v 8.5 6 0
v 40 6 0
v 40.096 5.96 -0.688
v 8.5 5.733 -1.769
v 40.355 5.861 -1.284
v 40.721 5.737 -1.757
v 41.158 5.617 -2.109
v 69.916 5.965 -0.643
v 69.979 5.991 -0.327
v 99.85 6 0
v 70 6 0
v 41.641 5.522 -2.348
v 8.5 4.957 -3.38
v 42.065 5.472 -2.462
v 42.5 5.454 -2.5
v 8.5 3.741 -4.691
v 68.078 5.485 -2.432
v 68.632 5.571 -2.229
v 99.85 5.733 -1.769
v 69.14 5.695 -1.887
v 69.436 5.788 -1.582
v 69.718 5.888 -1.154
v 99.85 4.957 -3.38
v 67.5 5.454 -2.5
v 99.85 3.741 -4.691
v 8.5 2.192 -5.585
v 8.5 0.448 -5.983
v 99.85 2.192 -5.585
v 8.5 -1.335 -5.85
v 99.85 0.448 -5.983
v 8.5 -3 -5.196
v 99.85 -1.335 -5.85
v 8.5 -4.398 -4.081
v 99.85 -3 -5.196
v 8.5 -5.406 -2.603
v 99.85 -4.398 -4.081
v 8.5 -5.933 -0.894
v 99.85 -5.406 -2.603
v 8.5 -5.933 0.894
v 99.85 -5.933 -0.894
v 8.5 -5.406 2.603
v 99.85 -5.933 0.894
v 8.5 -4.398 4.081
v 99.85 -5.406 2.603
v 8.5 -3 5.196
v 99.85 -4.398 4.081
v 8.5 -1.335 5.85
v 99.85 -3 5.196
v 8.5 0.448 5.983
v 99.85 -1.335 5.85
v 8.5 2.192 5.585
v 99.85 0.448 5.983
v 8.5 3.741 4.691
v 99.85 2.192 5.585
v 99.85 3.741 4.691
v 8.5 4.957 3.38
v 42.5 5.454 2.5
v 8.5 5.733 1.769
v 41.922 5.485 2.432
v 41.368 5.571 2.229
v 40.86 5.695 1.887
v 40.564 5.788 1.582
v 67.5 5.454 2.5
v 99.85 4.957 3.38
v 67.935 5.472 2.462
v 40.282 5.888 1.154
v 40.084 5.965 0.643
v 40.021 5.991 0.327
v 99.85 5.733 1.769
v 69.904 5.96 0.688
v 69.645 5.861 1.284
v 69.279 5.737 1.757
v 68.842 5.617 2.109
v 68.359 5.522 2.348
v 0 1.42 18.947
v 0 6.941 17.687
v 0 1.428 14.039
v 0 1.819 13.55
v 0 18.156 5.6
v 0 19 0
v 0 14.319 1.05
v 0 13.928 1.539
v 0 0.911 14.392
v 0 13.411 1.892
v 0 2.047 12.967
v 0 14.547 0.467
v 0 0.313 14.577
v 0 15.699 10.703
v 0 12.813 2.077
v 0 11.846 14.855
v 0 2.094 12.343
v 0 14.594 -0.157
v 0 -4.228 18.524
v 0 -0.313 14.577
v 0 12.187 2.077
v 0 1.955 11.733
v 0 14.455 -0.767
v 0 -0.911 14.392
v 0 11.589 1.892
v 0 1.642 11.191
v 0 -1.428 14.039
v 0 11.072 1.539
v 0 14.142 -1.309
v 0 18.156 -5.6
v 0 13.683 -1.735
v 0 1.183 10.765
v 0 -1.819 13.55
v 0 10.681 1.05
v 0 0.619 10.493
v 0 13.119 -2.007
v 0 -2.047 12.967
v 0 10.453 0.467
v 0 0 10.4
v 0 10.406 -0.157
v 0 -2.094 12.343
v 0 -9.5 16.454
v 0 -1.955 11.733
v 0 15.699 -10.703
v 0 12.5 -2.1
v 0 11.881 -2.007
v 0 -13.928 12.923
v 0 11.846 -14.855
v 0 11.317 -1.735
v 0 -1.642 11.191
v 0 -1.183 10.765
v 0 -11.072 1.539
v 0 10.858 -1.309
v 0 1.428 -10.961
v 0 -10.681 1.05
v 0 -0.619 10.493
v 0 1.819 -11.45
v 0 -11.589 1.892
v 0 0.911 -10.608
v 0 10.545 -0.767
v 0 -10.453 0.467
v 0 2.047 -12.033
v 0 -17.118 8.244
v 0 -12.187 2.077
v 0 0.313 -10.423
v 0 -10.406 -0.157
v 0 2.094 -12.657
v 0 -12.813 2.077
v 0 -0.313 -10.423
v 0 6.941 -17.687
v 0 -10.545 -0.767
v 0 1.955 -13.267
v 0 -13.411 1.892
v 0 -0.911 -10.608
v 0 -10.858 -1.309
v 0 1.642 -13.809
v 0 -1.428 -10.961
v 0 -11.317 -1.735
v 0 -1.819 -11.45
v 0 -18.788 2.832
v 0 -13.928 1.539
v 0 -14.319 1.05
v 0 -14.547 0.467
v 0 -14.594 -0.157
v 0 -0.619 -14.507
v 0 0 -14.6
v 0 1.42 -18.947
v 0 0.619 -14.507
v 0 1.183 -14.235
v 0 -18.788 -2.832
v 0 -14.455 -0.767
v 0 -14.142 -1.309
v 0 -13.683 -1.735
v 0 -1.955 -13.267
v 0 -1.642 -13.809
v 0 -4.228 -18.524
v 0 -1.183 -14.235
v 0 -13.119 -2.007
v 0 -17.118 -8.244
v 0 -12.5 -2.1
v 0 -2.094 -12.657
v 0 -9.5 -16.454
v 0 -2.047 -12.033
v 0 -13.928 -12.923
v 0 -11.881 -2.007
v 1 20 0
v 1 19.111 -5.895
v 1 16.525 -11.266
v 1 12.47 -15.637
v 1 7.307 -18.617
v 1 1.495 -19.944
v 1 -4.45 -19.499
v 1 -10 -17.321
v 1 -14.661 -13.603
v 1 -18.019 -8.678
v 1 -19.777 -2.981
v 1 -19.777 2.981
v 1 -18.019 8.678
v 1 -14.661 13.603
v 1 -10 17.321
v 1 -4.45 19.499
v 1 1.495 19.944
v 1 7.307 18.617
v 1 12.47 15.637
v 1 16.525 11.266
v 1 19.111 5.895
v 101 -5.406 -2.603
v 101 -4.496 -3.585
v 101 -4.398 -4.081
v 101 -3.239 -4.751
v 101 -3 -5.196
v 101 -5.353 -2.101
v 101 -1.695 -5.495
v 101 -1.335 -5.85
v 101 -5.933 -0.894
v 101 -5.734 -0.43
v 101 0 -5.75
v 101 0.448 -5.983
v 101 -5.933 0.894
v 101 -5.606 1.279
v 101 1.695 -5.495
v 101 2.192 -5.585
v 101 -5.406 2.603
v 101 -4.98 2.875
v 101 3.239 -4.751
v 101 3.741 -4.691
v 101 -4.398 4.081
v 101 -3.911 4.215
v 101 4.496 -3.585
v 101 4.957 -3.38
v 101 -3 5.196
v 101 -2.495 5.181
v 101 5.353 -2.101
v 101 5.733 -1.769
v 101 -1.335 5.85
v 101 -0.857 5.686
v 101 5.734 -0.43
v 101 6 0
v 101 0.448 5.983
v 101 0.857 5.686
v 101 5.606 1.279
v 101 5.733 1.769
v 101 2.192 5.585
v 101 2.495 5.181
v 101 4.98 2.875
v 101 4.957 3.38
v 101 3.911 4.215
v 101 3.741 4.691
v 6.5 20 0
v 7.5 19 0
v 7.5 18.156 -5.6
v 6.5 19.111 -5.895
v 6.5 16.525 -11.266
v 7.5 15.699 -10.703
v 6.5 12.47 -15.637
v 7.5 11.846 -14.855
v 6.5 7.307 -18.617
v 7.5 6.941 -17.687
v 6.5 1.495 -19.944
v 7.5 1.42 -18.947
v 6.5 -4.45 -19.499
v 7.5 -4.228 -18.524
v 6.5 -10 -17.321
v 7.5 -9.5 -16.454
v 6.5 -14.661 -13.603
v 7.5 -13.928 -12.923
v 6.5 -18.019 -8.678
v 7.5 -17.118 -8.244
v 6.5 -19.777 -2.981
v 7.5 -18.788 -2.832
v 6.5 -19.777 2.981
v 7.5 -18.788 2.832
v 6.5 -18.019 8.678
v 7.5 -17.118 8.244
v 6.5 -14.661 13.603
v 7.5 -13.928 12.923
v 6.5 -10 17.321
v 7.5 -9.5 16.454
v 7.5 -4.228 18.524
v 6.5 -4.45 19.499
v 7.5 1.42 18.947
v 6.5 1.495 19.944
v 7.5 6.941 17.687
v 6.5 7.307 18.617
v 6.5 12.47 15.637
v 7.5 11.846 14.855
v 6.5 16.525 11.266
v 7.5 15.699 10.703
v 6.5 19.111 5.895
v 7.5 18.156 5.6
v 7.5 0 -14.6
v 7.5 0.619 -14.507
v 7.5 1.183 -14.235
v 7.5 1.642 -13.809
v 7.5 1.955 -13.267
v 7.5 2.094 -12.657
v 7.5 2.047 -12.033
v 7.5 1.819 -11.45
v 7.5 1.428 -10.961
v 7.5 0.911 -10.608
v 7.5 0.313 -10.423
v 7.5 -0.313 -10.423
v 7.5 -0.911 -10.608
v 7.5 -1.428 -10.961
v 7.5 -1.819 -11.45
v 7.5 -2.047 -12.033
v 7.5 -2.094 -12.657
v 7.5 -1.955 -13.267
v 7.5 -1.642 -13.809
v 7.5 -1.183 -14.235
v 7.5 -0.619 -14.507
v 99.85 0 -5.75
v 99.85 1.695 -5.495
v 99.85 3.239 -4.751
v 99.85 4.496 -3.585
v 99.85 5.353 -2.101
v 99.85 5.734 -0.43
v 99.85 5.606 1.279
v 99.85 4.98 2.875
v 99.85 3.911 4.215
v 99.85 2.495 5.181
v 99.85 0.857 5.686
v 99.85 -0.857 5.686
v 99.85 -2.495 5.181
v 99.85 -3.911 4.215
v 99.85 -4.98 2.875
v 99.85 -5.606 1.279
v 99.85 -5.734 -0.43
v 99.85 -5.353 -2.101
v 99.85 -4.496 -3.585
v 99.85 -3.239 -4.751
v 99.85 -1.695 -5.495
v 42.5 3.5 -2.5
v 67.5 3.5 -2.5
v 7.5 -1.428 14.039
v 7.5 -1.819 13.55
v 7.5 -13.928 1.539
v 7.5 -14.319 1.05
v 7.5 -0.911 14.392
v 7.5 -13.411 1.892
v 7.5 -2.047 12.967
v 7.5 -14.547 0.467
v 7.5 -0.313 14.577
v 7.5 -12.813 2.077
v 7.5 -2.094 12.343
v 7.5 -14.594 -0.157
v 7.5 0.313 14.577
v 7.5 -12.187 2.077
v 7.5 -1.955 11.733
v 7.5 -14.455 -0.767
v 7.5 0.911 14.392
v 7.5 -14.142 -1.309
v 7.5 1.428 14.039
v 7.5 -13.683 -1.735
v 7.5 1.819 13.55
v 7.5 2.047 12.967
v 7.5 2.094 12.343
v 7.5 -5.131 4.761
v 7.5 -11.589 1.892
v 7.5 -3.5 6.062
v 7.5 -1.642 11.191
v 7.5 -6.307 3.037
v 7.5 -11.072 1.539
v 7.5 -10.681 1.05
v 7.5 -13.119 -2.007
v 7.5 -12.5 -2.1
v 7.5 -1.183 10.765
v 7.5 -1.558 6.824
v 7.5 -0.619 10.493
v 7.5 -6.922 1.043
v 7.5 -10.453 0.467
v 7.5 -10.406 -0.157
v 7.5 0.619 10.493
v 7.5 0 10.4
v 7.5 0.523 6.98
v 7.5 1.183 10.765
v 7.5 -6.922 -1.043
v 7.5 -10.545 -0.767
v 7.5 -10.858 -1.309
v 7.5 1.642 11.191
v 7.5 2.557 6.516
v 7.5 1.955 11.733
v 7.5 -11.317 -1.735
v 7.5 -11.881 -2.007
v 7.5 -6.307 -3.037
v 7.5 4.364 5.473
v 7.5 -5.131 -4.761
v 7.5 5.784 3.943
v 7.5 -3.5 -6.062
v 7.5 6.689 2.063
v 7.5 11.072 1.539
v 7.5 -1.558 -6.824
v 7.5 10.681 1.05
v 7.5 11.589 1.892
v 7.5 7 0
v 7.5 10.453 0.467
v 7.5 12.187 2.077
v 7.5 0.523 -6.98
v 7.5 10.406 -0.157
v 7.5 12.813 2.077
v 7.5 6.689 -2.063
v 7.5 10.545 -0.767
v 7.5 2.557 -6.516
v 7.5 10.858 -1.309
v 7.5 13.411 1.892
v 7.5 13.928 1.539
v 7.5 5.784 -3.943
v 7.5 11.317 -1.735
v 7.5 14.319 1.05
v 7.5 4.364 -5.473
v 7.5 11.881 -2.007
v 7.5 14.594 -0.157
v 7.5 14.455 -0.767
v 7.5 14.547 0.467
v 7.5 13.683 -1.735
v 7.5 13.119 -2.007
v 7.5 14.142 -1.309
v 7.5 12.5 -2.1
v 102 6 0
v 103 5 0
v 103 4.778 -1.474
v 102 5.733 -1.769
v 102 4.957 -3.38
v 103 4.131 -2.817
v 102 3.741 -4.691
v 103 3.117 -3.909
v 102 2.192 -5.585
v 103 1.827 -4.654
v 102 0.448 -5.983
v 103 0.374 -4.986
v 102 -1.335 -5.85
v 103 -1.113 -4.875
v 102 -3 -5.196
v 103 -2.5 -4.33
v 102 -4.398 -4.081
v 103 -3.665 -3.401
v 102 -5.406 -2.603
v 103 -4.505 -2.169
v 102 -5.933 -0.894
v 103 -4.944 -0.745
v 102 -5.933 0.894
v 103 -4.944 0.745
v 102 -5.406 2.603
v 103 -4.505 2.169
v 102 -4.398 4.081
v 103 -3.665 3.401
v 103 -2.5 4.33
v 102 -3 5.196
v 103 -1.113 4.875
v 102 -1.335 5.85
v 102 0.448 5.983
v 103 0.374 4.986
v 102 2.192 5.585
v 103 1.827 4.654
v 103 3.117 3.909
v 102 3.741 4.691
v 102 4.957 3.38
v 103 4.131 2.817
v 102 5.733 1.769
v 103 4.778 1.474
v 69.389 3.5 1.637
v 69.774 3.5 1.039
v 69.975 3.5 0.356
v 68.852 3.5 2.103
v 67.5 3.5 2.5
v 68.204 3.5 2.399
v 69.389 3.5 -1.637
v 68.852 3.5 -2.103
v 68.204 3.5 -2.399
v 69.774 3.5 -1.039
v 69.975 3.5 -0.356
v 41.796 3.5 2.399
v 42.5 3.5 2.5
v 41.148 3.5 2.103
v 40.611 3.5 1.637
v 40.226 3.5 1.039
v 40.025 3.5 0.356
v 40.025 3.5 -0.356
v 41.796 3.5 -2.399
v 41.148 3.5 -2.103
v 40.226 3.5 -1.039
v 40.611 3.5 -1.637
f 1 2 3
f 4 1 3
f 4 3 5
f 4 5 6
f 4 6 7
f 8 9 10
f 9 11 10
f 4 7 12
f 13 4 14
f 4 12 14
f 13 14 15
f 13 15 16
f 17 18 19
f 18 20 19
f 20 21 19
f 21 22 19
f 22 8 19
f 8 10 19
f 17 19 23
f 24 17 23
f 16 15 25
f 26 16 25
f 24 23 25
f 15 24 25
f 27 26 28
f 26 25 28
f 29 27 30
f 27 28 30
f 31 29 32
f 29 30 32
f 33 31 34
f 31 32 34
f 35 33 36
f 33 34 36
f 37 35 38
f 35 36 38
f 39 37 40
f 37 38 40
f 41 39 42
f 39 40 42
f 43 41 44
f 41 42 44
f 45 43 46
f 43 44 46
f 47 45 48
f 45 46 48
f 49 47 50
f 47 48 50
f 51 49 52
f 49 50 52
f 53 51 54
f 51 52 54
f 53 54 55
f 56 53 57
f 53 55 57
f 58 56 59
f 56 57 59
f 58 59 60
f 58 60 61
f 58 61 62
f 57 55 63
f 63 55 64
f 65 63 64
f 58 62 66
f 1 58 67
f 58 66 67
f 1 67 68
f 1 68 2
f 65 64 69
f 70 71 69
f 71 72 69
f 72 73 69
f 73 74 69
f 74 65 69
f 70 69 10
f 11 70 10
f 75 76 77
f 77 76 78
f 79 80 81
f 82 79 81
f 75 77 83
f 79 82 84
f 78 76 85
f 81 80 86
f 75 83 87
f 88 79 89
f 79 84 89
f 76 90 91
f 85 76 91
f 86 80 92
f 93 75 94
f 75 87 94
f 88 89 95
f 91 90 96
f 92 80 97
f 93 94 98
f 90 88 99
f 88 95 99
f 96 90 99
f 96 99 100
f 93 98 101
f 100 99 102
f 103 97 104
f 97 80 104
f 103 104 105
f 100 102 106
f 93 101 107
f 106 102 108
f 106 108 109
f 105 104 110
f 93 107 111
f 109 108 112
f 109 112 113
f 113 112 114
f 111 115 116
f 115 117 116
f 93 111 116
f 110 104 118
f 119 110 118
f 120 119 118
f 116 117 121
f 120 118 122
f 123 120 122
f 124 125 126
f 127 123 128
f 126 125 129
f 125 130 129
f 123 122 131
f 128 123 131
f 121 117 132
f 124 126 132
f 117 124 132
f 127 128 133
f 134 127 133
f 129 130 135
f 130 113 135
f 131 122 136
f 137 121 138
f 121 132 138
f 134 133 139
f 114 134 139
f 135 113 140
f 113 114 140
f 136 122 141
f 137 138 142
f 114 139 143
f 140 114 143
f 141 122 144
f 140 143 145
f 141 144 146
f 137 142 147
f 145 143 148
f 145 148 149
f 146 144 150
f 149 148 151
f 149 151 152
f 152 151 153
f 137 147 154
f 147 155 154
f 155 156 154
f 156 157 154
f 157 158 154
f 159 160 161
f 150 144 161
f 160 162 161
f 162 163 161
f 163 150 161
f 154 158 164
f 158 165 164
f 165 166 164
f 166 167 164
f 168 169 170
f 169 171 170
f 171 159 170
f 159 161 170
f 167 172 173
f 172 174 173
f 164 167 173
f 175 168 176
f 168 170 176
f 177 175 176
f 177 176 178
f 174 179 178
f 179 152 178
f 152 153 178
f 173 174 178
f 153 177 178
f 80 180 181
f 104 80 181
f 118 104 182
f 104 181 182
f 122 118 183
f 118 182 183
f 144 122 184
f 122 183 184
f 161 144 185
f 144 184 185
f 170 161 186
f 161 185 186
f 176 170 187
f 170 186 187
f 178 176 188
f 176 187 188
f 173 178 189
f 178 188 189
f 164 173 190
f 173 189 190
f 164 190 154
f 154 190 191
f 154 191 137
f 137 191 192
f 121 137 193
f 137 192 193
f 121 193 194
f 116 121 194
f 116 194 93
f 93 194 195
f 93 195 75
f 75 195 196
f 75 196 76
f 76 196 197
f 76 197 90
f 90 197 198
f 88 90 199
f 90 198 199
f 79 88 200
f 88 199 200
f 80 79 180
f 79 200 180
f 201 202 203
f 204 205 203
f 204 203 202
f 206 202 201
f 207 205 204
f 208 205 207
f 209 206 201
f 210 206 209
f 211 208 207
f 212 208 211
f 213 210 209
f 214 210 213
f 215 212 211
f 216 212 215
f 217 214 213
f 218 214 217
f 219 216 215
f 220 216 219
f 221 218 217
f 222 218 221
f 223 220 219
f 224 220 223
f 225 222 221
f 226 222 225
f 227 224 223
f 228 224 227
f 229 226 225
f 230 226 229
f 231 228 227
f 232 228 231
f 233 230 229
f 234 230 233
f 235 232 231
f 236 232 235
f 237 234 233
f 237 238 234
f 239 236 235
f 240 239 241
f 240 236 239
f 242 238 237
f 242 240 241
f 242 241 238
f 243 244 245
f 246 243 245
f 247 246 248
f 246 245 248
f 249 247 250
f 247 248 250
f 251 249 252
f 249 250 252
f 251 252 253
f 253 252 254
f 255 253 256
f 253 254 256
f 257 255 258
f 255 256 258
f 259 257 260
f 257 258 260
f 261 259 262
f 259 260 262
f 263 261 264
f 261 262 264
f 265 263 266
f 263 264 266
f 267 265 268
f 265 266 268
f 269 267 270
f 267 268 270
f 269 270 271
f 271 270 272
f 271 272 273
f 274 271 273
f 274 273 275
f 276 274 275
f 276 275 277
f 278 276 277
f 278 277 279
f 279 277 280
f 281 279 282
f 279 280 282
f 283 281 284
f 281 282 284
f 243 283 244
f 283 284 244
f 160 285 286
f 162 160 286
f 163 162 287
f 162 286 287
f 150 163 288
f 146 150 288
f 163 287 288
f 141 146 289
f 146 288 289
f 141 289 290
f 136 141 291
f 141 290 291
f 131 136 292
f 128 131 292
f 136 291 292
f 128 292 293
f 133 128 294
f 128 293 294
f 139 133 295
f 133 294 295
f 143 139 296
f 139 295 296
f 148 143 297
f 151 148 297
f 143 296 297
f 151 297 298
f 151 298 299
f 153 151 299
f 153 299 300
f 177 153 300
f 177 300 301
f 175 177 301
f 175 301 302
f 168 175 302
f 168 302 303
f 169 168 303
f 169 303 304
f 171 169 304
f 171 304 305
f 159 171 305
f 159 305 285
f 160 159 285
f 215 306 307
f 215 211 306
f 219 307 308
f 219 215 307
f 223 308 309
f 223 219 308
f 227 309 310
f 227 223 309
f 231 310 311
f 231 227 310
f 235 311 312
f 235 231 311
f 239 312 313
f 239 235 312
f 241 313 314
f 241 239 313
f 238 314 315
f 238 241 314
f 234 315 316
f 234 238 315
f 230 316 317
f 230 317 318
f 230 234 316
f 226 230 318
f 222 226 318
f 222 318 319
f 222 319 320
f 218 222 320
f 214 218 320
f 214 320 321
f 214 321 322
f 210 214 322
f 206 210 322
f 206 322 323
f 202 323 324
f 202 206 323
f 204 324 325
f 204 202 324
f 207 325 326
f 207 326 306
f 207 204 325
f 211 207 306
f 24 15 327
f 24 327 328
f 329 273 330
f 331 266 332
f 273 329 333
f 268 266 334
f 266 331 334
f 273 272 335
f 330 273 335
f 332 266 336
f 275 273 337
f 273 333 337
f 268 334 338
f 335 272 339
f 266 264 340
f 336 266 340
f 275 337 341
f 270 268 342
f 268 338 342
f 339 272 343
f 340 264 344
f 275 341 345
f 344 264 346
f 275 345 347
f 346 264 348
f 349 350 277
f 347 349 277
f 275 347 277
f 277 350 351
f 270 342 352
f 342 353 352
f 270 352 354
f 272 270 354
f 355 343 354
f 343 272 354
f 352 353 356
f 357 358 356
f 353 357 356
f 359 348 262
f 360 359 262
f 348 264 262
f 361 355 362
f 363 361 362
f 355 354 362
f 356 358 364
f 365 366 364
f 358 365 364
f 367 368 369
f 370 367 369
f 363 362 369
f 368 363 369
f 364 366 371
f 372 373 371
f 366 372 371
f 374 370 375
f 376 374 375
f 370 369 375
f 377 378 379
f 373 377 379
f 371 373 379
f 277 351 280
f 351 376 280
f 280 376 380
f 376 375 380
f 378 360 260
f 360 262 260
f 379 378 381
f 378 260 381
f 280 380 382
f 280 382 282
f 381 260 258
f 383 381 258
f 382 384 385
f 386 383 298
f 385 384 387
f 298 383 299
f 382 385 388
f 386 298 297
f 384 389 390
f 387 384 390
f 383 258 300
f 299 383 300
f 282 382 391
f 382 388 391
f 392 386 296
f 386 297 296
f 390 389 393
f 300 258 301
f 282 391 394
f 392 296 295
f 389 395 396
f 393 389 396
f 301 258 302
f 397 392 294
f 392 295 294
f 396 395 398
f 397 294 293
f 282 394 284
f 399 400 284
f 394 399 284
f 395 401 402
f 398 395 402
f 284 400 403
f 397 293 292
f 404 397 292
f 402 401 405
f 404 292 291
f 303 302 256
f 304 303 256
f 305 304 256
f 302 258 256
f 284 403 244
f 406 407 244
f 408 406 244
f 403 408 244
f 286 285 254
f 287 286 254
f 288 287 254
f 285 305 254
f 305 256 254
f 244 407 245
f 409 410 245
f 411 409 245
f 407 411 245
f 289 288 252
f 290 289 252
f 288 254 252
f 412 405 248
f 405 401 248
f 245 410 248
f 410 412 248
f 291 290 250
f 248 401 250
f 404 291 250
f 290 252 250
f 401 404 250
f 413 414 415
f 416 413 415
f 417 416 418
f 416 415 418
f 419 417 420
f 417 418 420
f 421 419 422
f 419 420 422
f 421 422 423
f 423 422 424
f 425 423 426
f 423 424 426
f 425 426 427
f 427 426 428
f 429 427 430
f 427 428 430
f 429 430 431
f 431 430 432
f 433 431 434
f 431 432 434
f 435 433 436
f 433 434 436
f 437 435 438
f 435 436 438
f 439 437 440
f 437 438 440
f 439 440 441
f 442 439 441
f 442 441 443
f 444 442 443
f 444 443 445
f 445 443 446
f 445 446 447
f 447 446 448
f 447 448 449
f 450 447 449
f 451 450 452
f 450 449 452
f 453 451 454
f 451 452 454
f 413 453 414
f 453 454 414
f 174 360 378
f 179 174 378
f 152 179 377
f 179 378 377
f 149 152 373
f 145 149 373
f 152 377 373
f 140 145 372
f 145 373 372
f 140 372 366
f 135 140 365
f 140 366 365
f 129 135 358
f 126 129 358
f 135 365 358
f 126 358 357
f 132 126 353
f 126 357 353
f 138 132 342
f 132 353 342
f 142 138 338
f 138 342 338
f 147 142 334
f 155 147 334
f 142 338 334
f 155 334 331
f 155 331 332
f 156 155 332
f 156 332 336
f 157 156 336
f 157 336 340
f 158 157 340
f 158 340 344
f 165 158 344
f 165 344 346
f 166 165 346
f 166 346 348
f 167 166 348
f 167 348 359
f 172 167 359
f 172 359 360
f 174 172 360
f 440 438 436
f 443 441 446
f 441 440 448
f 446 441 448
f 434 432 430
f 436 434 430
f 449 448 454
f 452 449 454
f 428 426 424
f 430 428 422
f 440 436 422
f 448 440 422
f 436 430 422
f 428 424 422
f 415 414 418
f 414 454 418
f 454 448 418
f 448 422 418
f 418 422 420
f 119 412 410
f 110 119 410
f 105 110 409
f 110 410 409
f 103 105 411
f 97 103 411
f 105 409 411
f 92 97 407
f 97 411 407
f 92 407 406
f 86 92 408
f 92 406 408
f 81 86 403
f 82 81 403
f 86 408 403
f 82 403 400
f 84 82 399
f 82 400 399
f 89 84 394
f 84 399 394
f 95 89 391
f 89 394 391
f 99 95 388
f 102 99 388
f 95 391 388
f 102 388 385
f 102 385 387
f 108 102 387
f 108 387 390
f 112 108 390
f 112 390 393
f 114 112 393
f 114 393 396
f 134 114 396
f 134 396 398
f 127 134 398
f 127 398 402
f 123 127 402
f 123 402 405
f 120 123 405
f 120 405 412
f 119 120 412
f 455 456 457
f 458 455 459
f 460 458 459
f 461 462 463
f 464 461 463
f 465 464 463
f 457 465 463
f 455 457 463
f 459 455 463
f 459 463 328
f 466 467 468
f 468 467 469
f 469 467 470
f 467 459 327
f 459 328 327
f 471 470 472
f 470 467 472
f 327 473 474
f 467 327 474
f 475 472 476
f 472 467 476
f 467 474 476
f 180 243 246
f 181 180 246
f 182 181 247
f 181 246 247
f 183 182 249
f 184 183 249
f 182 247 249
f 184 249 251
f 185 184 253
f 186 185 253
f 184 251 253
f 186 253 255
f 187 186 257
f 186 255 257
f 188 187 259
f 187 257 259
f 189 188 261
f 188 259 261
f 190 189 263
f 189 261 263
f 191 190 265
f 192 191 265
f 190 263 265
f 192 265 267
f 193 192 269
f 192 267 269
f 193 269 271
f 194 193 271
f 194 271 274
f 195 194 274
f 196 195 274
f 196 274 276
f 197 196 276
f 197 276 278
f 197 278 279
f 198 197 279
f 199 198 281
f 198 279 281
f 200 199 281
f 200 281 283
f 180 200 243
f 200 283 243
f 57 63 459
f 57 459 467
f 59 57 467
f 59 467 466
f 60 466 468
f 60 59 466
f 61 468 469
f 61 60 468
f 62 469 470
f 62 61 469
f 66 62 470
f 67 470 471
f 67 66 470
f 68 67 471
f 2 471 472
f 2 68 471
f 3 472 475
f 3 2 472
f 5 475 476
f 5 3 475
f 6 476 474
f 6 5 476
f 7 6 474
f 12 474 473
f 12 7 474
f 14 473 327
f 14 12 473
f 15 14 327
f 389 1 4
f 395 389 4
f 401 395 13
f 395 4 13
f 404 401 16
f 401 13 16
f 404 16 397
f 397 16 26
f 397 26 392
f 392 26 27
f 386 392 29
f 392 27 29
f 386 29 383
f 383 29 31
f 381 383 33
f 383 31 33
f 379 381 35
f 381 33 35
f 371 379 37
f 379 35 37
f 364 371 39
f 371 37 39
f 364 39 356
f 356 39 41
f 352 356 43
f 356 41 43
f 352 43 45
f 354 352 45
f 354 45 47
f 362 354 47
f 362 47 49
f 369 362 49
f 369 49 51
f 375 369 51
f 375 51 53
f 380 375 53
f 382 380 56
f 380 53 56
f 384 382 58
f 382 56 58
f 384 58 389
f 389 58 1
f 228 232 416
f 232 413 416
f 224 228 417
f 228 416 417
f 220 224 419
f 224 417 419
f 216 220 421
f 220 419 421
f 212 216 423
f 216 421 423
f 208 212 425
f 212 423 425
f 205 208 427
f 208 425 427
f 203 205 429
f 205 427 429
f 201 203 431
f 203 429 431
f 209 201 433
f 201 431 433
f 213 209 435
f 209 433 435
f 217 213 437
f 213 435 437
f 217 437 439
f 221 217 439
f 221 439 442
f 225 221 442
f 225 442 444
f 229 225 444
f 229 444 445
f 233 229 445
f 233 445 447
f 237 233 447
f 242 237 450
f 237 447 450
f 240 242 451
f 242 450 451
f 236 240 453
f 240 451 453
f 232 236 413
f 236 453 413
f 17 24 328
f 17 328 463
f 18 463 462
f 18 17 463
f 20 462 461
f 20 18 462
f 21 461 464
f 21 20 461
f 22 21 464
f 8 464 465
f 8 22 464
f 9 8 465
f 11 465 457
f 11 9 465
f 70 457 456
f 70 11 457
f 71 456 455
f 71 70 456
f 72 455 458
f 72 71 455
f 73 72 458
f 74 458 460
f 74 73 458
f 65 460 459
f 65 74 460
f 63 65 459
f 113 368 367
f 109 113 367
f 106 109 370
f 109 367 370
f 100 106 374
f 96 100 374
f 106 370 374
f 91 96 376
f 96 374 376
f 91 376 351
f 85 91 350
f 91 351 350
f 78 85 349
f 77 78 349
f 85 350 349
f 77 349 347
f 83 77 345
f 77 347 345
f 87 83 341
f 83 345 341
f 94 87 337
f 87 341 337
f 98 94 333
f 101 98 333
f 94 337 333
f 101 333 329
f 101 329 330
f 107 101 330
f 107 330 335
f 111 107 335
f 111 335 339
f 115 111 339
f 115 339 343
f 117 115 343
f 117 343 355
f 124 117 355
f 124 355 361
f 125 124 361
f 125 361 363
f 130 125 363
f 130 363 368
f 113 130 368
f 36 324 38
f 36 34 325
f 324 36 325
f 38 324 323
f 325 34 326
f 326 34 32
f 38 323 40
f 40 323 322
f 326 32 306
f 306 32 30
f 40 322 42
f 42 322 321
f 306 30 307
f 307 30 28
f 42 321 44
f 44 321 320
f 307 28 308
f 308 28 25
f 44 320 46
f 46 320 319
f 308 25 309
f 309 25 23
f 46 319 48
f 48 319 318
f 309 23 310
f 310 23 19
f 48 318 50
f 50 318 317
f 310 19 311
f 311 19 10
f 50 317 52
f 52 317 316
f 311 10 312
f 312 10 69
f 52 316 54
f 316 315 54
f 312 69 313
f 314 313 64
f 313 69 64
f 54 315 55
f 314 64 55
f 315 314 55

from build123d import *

# Parameters (mm, degrees)
CHAMFER1_SIZE      = 1
M5_TAPPED_HOLE1_D  = 4.2
CUT_EXTRUDE1_DEPTH = 2.5
SKETCH6_W          = 1.15
SKETCH6_H          = 0.25


with BuildPart() as part:
    # Sketch1 → Revolve1 (revolve)
    with BuildSketch(Plane.XY):
        Polygon((0, 0), (0, 20), (7.5, 20), (7.5, 6), (103, 6), (103, 0), align=None)
    revolve(axis=Axis((103, 0, 0), (-1, 0, 0)))

    # Chamfer1
    chamfer1_edges = [part.edges().sort_by_distance(p)[0] for p in [
        (103, -6, 0),
        (7.5, -6, 0),
        (7.5, -20, 0),
        (0, -20, 0),
    ]]
    chamfer(chamfer1_edges, length=CHAMFER1_SIZE)

    # M5 Tapped Hole1 (through all)
    with Locations(Plane.ZY):
        with Locations((-12.5, 0), (0, 12.5), (12.5, 0), (0, -12.5)):
            Hole(M5_TAPPED_HOLE1_D / 2)

    # Sketch5 → Cut-Extrude1 (cut)
    with BuildSketch(Plane(origin=(0, 6, 0), x_dir=(1, 0, 0), z_dir=(0, 1, 0))):
        with BuildLine():
            Line((42.5, 2.5), (67.5, 2.5))
            ThreePointArc((67.5, 2.5), (70, 0), (67.5, -2.5))
            Line((67.5, -2.5), (42.5, -2.5))
            ThreePointArc((42.5, -2.5), (40, 0), (42.5, 2.5))
        make_face()
    extrude(amount=-CUT_EXTRUDE1_DEPTH, mode=Mode.SUBTRACT)

    # Sketch6 → Cut-Revolve1 (revolve, cut)
    with BuildSketch(Plane(origin=(0, 0, 0), x_dir=(1, 0, 0), z_dir=(0, 1, 0))):
        with Locations((100.425, 5.875)):
            Rectangle(SKETCH6_W, SKETCH6_H)
    revolve(axis=Axis((0, 0, 0), (1, 0, 0)), mode=Mode.SUBTRACT)


solid = part.part
